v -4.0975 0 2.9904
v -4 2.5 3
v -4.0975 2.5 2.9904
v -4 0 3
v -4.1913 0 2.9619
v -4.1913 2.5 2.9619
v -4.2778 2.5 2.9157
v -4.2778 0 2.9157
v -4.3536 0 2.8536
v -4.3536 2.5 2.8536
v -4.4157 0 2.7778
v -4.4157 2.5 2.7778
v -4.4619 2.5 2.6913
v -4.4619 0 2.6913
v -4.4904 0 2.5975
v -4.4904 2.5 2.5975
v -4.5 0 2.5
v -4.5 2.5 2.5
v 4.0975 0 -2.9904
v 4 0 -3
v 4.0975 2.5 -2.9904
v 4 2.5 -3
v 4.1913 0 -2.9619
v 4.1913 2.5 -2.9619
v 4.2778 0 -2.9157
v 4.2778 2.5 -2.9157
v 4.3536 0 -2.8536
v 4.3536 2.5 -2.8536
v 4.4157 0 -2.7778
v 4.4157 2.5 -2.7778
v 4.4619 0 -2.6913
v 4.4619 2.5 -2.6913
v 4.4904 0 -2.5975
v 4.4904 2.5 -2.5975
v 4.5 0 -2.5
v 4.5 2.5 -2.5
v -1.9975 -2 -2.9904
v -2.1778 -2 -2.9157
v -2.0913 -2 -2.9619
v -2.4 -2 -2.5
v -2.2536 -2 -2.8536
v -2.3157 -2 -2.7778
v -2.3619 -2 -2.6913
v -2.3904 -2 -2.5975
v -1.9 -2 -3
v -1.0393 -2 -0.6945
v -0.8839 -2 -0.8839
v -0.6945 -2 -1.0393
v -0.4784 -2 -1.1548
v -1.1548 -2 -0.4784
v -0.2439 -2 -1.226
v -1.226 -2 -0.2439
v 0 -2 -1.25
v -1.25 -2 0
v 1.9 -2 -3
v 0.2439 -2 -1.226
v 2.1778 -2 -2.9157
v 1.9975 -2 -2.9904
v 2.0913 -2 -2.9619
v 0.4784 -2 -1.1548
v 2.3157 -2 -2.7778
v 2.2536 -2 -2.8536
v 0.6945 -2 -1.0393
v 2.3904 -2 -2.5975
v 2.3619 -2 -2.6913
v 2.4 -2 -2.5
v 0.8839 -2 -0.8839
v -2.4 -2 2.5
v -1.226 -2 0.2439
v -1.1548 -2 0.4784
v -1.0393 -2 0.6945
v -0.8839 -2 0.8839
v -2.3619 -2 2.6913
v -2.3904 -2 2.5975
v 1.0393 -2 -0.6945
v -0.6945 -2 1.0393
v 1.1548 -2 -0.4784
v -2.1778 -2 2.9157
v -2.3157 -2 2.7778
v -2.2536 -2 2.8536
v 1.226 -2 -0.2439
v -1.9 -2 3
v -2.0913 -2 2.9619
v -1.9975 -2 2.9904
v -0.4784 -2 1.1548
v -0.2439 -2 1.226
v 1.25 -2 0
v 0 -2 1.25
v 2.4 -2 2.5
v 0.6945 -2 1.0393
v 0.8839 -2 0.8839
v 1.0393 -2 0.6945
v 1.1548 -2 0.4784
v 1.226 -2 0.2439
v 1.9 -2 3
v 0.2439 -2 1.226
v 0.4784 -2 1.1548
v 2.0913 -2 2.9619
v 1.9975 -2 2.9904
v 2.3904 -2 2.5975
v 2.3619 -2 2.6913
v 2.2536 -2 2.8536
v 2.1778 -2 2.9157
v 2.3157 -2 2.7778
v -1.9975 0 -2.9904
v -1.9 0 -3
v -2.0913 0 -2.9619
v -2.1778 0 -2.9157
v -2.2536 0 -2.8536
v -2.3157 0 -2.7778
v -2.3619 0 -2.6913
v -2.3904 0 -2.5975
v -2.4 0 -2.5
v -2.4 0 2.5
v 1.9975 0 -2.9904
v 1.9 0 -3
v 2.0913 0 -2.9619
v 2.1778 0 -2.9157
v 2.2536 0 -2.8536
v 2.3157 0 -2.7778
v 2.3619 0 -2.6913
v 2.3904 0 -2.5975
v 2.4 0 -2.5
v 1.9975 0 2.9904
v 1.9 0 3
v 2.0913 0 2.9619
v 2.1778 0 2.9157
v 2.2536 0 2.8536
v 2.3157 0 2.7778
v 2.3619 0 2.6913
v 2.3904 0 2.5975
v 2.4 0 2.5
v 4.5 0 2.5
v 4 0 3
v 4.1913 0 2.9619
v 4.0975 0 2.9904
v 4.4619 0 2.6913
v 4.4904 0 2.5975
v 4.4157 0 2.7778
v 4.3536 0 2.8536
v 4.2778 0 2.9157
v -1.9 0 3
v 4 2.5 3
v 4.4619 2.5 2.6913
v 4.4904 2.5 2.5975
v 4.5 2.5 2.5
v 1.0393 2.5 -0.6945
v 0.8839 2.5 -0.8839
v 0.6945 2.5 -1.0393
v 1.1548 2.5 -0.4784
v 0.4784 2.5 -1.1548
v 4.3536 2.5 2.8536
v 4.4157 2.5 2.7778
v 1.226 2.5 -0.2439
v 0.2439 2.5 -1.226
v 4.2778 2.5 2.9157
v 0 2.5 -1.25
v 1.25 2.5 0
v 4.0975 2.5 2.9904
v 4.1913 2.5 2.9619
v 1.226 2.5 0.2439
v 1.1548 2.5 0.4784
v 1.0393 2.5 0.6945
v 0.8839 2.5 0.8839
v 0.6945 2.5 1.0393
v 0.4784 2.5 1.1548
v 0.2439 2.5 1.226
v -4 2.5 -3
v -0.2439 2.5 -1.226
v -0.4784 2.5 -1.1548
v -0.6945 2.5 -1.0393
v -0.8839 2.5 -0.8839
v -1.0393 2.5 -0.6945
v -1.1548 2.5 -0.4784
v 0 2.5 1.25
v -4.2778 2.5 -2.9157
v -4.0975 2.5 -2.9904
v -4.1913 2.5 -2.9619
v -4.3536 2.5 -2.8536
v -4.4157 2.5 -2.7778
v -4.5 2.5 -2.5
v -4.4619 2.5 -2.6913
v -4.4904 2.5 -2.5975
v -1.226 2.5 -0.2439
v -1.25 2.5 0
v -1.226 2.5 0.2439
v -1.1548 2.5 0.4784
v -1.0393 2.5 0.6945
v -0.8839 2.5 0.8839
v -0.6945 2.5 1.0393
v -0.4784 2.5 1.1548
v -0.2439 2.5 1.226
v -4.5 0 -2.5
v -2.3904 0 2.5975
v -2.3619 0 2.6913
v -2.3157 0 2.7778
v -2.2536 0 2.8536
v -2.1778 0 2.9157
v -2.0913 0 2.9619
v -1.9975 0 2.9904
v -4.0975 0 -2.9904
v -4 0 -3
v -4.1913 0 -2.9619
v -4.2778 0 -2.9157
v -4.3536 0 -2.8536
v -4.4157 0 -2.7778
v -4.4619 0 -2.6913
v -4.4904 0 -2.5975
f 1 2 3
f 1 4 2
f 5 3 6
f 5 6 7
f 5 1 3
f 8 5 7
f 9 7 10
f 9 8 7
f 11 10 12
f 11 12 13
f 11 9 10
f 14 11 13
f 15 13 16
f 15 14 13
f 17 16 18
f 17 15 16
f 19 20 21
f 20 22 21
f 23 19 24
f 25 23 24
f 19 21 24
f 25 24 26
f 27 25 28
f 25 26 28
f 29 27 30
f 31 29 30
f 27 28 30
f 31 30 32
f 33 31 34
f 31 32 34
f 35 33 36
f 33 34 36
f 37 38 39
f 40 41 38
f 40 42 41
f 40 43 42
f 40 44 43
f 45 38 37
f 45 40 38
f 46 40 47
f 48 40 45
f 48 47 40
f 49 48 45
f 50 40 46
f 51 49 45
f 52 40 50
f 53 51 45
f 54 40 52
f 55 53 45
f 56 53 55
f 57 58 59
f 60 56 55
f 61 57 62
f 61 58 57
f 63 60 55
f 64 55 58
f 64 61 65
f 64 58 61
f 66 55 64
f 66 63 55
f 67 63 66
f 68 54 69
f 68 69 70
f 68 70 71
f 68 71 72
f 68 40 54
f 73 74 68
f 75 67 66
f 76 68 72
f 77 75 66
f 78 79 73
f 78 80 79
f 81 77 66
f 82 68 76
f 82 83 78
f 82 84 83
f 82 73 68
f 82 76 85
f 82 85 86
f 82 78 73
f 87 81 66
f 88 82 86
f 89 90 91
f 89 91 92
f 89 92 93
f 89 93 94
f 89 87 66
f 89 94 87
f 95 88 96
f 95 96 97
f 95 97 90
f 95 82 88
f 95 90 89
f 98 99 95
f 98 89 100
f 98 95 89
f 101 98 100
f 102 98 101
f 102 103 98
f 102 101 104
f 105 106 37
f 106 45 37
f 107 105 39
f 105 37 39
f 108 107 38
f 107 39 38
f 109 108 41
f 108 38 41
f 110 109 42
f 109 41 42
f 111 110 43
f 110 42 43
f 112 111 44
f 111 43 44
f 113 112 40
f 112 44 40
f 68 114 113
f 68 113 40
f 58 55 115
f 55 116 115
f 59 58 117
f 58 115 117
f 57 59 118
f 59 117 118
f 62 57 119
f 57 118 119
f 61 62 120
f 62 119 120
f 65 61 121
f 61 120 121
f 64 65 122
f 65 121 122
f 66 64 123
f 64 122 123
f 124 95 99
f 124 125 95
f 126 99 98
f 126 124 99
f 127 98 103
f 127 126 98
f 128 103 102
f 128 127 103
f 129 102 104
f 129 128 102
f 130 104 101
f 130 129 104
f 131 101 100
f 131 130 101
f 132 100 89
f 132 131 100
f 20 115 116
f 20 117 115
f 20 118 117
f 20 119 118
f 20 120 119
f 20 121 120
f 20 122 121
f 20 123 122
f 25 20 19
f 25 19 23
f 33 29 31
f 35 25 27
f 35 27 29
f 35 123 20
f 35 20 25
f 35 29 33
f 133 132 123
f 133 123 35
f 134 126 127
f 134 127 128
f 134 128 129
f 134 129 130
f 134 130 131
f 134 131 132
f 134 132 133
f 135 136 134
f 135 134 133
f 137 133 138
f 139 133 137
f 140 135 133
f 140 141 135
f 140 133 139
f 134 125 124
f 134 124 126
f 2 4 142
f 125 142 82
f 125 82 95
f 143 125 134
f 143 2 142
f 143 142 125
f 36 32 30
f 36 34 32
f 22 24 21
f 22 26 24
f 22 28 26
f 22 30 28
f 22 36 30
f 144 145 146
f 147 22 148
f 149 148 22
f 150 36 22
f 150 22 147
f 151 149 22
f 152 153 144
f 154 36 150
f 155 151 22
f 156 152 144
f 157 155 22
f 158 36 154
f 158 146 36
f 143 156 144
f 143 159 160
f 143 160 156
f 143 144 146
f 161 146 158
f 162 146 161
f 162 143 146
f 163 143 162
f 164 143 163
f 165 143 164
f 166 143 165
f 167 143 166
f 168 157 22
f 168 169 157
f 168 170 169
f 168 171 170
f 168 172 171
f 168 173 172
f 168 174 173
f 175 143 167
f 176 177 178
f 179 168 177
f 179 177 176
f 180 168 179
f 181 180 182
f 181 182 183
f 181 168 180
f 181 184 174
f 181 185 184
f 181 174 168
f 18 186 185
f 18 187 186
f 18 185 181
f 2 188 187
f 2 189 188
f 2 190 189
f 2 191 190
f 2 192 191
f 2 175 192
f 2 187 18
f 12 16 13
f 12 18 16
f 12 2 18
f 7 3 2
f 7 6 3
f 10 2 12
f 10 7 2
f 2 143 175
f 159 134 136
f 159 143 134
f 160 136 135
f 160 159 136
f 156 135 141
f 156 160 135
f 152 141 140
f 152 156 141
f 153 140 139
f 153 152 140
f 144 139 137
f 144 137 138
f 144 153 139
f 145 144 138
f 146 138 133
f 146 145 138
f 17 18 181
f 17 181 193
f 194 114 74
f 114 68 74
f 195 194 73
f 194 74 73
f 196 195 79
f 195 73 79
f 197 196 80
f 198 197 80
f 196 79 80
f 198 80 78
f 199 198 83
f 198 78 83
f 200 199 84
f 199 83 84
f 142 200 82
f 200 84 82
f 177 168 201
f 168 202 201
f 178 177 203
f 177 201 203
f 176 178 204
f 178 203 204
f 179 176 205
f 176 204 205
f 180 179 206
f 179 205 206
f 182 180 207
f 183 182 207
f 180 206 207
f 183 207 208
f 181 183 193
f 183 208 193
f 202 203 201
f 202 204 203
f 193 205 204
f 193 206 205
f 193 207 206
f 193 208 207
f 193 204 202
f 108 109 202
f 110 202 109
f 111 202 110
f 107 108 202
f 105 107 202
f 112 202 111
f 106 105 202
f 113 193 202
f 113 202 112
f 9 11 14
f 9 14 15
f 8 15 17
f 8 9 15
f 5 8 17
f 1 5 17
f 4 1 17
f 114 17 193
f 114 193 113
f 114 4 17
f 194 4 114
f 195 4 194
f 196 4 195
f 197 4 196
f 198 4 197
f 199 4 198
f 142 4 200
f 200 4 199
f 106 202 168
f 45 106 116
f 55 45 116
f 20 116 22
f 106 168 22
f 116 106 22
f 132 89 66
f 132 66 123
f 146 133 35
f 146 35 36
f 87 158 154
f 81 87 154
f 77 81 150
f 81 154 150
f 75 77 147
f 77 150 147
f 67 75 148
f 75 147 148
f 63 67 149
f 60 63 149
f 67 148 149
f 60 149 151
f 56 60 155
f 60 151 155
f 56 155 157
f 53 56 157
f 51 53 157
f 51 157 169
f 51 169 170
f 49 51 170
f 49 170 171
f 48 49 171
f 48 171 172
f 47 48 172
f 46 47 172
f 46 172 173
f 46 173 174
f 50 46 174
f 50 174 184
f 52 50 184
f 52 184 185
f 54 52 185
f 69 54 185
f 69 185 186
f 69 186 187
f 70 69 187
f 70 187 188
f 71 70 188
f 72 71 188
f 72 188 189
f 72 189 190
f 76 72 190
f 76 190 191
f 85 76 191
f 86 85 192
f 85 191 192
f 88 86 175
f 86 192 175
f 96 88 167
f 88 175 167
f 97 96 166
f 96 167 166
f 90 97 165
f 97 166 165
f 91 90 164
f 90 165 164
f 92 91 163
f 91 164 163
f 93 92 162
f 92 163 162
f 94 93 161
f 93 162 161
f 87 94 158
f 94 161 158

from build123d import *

# Parameters (mm, degrees)
BOSS_EXTRU_1_DEPTH      = 3
ESQUISSE2_R             = 1.25
ENL_V_MAT_EXTRU_1_DEPTH = 5.5
CONG_1_R                = 0.5


with BuildPart() as part:
    # Esquisse1 → Boss.-Extru.1 (new body, symmetric)
    with BuildSketch(Plane.XY):
        Polygon((-4.5, 0), (-2.4, 0), (-2.4, -2), (2.4, -2), (2.4, 0), (4.5, 0), (4.5, 2.5), (-4.5, 2.5), align=None)
    extrude(amount=BOSS_EXTRU_1_DEPTH, both=True)

    # Esquisse2 → Enlèv. mat.-Extru.1 (cut, through all)
    with BuildSketch(Plane(origin=(0, 2.5, 0), x_dir=(1, 0, 0), z_dir=(0, 1, 0))):
        Circle(ESQUISSE2_R)
    extrude(amount=-ENL_V_MAT_EXTRU_1_DEPTH, mode=Mode.SUBTRACT)

    # Congé1
    cong_1_edges = [part.edges().sort_by_distance(p)[0] for p in [
        (-4.5, 1.25, -3),
        (4.5, 1.25, -3),
        (-4.5, 1.25, 3),
        (-2.4, -1, 3),
        (2.4, -1, 3),
        (4.5, 1.25, 3),
        (2.4, -1, -3),
        (-2.4, -1, -3),
    ]]
    fillet(cong_1_edges, radius=CONG_1_R)


solid = part.part
